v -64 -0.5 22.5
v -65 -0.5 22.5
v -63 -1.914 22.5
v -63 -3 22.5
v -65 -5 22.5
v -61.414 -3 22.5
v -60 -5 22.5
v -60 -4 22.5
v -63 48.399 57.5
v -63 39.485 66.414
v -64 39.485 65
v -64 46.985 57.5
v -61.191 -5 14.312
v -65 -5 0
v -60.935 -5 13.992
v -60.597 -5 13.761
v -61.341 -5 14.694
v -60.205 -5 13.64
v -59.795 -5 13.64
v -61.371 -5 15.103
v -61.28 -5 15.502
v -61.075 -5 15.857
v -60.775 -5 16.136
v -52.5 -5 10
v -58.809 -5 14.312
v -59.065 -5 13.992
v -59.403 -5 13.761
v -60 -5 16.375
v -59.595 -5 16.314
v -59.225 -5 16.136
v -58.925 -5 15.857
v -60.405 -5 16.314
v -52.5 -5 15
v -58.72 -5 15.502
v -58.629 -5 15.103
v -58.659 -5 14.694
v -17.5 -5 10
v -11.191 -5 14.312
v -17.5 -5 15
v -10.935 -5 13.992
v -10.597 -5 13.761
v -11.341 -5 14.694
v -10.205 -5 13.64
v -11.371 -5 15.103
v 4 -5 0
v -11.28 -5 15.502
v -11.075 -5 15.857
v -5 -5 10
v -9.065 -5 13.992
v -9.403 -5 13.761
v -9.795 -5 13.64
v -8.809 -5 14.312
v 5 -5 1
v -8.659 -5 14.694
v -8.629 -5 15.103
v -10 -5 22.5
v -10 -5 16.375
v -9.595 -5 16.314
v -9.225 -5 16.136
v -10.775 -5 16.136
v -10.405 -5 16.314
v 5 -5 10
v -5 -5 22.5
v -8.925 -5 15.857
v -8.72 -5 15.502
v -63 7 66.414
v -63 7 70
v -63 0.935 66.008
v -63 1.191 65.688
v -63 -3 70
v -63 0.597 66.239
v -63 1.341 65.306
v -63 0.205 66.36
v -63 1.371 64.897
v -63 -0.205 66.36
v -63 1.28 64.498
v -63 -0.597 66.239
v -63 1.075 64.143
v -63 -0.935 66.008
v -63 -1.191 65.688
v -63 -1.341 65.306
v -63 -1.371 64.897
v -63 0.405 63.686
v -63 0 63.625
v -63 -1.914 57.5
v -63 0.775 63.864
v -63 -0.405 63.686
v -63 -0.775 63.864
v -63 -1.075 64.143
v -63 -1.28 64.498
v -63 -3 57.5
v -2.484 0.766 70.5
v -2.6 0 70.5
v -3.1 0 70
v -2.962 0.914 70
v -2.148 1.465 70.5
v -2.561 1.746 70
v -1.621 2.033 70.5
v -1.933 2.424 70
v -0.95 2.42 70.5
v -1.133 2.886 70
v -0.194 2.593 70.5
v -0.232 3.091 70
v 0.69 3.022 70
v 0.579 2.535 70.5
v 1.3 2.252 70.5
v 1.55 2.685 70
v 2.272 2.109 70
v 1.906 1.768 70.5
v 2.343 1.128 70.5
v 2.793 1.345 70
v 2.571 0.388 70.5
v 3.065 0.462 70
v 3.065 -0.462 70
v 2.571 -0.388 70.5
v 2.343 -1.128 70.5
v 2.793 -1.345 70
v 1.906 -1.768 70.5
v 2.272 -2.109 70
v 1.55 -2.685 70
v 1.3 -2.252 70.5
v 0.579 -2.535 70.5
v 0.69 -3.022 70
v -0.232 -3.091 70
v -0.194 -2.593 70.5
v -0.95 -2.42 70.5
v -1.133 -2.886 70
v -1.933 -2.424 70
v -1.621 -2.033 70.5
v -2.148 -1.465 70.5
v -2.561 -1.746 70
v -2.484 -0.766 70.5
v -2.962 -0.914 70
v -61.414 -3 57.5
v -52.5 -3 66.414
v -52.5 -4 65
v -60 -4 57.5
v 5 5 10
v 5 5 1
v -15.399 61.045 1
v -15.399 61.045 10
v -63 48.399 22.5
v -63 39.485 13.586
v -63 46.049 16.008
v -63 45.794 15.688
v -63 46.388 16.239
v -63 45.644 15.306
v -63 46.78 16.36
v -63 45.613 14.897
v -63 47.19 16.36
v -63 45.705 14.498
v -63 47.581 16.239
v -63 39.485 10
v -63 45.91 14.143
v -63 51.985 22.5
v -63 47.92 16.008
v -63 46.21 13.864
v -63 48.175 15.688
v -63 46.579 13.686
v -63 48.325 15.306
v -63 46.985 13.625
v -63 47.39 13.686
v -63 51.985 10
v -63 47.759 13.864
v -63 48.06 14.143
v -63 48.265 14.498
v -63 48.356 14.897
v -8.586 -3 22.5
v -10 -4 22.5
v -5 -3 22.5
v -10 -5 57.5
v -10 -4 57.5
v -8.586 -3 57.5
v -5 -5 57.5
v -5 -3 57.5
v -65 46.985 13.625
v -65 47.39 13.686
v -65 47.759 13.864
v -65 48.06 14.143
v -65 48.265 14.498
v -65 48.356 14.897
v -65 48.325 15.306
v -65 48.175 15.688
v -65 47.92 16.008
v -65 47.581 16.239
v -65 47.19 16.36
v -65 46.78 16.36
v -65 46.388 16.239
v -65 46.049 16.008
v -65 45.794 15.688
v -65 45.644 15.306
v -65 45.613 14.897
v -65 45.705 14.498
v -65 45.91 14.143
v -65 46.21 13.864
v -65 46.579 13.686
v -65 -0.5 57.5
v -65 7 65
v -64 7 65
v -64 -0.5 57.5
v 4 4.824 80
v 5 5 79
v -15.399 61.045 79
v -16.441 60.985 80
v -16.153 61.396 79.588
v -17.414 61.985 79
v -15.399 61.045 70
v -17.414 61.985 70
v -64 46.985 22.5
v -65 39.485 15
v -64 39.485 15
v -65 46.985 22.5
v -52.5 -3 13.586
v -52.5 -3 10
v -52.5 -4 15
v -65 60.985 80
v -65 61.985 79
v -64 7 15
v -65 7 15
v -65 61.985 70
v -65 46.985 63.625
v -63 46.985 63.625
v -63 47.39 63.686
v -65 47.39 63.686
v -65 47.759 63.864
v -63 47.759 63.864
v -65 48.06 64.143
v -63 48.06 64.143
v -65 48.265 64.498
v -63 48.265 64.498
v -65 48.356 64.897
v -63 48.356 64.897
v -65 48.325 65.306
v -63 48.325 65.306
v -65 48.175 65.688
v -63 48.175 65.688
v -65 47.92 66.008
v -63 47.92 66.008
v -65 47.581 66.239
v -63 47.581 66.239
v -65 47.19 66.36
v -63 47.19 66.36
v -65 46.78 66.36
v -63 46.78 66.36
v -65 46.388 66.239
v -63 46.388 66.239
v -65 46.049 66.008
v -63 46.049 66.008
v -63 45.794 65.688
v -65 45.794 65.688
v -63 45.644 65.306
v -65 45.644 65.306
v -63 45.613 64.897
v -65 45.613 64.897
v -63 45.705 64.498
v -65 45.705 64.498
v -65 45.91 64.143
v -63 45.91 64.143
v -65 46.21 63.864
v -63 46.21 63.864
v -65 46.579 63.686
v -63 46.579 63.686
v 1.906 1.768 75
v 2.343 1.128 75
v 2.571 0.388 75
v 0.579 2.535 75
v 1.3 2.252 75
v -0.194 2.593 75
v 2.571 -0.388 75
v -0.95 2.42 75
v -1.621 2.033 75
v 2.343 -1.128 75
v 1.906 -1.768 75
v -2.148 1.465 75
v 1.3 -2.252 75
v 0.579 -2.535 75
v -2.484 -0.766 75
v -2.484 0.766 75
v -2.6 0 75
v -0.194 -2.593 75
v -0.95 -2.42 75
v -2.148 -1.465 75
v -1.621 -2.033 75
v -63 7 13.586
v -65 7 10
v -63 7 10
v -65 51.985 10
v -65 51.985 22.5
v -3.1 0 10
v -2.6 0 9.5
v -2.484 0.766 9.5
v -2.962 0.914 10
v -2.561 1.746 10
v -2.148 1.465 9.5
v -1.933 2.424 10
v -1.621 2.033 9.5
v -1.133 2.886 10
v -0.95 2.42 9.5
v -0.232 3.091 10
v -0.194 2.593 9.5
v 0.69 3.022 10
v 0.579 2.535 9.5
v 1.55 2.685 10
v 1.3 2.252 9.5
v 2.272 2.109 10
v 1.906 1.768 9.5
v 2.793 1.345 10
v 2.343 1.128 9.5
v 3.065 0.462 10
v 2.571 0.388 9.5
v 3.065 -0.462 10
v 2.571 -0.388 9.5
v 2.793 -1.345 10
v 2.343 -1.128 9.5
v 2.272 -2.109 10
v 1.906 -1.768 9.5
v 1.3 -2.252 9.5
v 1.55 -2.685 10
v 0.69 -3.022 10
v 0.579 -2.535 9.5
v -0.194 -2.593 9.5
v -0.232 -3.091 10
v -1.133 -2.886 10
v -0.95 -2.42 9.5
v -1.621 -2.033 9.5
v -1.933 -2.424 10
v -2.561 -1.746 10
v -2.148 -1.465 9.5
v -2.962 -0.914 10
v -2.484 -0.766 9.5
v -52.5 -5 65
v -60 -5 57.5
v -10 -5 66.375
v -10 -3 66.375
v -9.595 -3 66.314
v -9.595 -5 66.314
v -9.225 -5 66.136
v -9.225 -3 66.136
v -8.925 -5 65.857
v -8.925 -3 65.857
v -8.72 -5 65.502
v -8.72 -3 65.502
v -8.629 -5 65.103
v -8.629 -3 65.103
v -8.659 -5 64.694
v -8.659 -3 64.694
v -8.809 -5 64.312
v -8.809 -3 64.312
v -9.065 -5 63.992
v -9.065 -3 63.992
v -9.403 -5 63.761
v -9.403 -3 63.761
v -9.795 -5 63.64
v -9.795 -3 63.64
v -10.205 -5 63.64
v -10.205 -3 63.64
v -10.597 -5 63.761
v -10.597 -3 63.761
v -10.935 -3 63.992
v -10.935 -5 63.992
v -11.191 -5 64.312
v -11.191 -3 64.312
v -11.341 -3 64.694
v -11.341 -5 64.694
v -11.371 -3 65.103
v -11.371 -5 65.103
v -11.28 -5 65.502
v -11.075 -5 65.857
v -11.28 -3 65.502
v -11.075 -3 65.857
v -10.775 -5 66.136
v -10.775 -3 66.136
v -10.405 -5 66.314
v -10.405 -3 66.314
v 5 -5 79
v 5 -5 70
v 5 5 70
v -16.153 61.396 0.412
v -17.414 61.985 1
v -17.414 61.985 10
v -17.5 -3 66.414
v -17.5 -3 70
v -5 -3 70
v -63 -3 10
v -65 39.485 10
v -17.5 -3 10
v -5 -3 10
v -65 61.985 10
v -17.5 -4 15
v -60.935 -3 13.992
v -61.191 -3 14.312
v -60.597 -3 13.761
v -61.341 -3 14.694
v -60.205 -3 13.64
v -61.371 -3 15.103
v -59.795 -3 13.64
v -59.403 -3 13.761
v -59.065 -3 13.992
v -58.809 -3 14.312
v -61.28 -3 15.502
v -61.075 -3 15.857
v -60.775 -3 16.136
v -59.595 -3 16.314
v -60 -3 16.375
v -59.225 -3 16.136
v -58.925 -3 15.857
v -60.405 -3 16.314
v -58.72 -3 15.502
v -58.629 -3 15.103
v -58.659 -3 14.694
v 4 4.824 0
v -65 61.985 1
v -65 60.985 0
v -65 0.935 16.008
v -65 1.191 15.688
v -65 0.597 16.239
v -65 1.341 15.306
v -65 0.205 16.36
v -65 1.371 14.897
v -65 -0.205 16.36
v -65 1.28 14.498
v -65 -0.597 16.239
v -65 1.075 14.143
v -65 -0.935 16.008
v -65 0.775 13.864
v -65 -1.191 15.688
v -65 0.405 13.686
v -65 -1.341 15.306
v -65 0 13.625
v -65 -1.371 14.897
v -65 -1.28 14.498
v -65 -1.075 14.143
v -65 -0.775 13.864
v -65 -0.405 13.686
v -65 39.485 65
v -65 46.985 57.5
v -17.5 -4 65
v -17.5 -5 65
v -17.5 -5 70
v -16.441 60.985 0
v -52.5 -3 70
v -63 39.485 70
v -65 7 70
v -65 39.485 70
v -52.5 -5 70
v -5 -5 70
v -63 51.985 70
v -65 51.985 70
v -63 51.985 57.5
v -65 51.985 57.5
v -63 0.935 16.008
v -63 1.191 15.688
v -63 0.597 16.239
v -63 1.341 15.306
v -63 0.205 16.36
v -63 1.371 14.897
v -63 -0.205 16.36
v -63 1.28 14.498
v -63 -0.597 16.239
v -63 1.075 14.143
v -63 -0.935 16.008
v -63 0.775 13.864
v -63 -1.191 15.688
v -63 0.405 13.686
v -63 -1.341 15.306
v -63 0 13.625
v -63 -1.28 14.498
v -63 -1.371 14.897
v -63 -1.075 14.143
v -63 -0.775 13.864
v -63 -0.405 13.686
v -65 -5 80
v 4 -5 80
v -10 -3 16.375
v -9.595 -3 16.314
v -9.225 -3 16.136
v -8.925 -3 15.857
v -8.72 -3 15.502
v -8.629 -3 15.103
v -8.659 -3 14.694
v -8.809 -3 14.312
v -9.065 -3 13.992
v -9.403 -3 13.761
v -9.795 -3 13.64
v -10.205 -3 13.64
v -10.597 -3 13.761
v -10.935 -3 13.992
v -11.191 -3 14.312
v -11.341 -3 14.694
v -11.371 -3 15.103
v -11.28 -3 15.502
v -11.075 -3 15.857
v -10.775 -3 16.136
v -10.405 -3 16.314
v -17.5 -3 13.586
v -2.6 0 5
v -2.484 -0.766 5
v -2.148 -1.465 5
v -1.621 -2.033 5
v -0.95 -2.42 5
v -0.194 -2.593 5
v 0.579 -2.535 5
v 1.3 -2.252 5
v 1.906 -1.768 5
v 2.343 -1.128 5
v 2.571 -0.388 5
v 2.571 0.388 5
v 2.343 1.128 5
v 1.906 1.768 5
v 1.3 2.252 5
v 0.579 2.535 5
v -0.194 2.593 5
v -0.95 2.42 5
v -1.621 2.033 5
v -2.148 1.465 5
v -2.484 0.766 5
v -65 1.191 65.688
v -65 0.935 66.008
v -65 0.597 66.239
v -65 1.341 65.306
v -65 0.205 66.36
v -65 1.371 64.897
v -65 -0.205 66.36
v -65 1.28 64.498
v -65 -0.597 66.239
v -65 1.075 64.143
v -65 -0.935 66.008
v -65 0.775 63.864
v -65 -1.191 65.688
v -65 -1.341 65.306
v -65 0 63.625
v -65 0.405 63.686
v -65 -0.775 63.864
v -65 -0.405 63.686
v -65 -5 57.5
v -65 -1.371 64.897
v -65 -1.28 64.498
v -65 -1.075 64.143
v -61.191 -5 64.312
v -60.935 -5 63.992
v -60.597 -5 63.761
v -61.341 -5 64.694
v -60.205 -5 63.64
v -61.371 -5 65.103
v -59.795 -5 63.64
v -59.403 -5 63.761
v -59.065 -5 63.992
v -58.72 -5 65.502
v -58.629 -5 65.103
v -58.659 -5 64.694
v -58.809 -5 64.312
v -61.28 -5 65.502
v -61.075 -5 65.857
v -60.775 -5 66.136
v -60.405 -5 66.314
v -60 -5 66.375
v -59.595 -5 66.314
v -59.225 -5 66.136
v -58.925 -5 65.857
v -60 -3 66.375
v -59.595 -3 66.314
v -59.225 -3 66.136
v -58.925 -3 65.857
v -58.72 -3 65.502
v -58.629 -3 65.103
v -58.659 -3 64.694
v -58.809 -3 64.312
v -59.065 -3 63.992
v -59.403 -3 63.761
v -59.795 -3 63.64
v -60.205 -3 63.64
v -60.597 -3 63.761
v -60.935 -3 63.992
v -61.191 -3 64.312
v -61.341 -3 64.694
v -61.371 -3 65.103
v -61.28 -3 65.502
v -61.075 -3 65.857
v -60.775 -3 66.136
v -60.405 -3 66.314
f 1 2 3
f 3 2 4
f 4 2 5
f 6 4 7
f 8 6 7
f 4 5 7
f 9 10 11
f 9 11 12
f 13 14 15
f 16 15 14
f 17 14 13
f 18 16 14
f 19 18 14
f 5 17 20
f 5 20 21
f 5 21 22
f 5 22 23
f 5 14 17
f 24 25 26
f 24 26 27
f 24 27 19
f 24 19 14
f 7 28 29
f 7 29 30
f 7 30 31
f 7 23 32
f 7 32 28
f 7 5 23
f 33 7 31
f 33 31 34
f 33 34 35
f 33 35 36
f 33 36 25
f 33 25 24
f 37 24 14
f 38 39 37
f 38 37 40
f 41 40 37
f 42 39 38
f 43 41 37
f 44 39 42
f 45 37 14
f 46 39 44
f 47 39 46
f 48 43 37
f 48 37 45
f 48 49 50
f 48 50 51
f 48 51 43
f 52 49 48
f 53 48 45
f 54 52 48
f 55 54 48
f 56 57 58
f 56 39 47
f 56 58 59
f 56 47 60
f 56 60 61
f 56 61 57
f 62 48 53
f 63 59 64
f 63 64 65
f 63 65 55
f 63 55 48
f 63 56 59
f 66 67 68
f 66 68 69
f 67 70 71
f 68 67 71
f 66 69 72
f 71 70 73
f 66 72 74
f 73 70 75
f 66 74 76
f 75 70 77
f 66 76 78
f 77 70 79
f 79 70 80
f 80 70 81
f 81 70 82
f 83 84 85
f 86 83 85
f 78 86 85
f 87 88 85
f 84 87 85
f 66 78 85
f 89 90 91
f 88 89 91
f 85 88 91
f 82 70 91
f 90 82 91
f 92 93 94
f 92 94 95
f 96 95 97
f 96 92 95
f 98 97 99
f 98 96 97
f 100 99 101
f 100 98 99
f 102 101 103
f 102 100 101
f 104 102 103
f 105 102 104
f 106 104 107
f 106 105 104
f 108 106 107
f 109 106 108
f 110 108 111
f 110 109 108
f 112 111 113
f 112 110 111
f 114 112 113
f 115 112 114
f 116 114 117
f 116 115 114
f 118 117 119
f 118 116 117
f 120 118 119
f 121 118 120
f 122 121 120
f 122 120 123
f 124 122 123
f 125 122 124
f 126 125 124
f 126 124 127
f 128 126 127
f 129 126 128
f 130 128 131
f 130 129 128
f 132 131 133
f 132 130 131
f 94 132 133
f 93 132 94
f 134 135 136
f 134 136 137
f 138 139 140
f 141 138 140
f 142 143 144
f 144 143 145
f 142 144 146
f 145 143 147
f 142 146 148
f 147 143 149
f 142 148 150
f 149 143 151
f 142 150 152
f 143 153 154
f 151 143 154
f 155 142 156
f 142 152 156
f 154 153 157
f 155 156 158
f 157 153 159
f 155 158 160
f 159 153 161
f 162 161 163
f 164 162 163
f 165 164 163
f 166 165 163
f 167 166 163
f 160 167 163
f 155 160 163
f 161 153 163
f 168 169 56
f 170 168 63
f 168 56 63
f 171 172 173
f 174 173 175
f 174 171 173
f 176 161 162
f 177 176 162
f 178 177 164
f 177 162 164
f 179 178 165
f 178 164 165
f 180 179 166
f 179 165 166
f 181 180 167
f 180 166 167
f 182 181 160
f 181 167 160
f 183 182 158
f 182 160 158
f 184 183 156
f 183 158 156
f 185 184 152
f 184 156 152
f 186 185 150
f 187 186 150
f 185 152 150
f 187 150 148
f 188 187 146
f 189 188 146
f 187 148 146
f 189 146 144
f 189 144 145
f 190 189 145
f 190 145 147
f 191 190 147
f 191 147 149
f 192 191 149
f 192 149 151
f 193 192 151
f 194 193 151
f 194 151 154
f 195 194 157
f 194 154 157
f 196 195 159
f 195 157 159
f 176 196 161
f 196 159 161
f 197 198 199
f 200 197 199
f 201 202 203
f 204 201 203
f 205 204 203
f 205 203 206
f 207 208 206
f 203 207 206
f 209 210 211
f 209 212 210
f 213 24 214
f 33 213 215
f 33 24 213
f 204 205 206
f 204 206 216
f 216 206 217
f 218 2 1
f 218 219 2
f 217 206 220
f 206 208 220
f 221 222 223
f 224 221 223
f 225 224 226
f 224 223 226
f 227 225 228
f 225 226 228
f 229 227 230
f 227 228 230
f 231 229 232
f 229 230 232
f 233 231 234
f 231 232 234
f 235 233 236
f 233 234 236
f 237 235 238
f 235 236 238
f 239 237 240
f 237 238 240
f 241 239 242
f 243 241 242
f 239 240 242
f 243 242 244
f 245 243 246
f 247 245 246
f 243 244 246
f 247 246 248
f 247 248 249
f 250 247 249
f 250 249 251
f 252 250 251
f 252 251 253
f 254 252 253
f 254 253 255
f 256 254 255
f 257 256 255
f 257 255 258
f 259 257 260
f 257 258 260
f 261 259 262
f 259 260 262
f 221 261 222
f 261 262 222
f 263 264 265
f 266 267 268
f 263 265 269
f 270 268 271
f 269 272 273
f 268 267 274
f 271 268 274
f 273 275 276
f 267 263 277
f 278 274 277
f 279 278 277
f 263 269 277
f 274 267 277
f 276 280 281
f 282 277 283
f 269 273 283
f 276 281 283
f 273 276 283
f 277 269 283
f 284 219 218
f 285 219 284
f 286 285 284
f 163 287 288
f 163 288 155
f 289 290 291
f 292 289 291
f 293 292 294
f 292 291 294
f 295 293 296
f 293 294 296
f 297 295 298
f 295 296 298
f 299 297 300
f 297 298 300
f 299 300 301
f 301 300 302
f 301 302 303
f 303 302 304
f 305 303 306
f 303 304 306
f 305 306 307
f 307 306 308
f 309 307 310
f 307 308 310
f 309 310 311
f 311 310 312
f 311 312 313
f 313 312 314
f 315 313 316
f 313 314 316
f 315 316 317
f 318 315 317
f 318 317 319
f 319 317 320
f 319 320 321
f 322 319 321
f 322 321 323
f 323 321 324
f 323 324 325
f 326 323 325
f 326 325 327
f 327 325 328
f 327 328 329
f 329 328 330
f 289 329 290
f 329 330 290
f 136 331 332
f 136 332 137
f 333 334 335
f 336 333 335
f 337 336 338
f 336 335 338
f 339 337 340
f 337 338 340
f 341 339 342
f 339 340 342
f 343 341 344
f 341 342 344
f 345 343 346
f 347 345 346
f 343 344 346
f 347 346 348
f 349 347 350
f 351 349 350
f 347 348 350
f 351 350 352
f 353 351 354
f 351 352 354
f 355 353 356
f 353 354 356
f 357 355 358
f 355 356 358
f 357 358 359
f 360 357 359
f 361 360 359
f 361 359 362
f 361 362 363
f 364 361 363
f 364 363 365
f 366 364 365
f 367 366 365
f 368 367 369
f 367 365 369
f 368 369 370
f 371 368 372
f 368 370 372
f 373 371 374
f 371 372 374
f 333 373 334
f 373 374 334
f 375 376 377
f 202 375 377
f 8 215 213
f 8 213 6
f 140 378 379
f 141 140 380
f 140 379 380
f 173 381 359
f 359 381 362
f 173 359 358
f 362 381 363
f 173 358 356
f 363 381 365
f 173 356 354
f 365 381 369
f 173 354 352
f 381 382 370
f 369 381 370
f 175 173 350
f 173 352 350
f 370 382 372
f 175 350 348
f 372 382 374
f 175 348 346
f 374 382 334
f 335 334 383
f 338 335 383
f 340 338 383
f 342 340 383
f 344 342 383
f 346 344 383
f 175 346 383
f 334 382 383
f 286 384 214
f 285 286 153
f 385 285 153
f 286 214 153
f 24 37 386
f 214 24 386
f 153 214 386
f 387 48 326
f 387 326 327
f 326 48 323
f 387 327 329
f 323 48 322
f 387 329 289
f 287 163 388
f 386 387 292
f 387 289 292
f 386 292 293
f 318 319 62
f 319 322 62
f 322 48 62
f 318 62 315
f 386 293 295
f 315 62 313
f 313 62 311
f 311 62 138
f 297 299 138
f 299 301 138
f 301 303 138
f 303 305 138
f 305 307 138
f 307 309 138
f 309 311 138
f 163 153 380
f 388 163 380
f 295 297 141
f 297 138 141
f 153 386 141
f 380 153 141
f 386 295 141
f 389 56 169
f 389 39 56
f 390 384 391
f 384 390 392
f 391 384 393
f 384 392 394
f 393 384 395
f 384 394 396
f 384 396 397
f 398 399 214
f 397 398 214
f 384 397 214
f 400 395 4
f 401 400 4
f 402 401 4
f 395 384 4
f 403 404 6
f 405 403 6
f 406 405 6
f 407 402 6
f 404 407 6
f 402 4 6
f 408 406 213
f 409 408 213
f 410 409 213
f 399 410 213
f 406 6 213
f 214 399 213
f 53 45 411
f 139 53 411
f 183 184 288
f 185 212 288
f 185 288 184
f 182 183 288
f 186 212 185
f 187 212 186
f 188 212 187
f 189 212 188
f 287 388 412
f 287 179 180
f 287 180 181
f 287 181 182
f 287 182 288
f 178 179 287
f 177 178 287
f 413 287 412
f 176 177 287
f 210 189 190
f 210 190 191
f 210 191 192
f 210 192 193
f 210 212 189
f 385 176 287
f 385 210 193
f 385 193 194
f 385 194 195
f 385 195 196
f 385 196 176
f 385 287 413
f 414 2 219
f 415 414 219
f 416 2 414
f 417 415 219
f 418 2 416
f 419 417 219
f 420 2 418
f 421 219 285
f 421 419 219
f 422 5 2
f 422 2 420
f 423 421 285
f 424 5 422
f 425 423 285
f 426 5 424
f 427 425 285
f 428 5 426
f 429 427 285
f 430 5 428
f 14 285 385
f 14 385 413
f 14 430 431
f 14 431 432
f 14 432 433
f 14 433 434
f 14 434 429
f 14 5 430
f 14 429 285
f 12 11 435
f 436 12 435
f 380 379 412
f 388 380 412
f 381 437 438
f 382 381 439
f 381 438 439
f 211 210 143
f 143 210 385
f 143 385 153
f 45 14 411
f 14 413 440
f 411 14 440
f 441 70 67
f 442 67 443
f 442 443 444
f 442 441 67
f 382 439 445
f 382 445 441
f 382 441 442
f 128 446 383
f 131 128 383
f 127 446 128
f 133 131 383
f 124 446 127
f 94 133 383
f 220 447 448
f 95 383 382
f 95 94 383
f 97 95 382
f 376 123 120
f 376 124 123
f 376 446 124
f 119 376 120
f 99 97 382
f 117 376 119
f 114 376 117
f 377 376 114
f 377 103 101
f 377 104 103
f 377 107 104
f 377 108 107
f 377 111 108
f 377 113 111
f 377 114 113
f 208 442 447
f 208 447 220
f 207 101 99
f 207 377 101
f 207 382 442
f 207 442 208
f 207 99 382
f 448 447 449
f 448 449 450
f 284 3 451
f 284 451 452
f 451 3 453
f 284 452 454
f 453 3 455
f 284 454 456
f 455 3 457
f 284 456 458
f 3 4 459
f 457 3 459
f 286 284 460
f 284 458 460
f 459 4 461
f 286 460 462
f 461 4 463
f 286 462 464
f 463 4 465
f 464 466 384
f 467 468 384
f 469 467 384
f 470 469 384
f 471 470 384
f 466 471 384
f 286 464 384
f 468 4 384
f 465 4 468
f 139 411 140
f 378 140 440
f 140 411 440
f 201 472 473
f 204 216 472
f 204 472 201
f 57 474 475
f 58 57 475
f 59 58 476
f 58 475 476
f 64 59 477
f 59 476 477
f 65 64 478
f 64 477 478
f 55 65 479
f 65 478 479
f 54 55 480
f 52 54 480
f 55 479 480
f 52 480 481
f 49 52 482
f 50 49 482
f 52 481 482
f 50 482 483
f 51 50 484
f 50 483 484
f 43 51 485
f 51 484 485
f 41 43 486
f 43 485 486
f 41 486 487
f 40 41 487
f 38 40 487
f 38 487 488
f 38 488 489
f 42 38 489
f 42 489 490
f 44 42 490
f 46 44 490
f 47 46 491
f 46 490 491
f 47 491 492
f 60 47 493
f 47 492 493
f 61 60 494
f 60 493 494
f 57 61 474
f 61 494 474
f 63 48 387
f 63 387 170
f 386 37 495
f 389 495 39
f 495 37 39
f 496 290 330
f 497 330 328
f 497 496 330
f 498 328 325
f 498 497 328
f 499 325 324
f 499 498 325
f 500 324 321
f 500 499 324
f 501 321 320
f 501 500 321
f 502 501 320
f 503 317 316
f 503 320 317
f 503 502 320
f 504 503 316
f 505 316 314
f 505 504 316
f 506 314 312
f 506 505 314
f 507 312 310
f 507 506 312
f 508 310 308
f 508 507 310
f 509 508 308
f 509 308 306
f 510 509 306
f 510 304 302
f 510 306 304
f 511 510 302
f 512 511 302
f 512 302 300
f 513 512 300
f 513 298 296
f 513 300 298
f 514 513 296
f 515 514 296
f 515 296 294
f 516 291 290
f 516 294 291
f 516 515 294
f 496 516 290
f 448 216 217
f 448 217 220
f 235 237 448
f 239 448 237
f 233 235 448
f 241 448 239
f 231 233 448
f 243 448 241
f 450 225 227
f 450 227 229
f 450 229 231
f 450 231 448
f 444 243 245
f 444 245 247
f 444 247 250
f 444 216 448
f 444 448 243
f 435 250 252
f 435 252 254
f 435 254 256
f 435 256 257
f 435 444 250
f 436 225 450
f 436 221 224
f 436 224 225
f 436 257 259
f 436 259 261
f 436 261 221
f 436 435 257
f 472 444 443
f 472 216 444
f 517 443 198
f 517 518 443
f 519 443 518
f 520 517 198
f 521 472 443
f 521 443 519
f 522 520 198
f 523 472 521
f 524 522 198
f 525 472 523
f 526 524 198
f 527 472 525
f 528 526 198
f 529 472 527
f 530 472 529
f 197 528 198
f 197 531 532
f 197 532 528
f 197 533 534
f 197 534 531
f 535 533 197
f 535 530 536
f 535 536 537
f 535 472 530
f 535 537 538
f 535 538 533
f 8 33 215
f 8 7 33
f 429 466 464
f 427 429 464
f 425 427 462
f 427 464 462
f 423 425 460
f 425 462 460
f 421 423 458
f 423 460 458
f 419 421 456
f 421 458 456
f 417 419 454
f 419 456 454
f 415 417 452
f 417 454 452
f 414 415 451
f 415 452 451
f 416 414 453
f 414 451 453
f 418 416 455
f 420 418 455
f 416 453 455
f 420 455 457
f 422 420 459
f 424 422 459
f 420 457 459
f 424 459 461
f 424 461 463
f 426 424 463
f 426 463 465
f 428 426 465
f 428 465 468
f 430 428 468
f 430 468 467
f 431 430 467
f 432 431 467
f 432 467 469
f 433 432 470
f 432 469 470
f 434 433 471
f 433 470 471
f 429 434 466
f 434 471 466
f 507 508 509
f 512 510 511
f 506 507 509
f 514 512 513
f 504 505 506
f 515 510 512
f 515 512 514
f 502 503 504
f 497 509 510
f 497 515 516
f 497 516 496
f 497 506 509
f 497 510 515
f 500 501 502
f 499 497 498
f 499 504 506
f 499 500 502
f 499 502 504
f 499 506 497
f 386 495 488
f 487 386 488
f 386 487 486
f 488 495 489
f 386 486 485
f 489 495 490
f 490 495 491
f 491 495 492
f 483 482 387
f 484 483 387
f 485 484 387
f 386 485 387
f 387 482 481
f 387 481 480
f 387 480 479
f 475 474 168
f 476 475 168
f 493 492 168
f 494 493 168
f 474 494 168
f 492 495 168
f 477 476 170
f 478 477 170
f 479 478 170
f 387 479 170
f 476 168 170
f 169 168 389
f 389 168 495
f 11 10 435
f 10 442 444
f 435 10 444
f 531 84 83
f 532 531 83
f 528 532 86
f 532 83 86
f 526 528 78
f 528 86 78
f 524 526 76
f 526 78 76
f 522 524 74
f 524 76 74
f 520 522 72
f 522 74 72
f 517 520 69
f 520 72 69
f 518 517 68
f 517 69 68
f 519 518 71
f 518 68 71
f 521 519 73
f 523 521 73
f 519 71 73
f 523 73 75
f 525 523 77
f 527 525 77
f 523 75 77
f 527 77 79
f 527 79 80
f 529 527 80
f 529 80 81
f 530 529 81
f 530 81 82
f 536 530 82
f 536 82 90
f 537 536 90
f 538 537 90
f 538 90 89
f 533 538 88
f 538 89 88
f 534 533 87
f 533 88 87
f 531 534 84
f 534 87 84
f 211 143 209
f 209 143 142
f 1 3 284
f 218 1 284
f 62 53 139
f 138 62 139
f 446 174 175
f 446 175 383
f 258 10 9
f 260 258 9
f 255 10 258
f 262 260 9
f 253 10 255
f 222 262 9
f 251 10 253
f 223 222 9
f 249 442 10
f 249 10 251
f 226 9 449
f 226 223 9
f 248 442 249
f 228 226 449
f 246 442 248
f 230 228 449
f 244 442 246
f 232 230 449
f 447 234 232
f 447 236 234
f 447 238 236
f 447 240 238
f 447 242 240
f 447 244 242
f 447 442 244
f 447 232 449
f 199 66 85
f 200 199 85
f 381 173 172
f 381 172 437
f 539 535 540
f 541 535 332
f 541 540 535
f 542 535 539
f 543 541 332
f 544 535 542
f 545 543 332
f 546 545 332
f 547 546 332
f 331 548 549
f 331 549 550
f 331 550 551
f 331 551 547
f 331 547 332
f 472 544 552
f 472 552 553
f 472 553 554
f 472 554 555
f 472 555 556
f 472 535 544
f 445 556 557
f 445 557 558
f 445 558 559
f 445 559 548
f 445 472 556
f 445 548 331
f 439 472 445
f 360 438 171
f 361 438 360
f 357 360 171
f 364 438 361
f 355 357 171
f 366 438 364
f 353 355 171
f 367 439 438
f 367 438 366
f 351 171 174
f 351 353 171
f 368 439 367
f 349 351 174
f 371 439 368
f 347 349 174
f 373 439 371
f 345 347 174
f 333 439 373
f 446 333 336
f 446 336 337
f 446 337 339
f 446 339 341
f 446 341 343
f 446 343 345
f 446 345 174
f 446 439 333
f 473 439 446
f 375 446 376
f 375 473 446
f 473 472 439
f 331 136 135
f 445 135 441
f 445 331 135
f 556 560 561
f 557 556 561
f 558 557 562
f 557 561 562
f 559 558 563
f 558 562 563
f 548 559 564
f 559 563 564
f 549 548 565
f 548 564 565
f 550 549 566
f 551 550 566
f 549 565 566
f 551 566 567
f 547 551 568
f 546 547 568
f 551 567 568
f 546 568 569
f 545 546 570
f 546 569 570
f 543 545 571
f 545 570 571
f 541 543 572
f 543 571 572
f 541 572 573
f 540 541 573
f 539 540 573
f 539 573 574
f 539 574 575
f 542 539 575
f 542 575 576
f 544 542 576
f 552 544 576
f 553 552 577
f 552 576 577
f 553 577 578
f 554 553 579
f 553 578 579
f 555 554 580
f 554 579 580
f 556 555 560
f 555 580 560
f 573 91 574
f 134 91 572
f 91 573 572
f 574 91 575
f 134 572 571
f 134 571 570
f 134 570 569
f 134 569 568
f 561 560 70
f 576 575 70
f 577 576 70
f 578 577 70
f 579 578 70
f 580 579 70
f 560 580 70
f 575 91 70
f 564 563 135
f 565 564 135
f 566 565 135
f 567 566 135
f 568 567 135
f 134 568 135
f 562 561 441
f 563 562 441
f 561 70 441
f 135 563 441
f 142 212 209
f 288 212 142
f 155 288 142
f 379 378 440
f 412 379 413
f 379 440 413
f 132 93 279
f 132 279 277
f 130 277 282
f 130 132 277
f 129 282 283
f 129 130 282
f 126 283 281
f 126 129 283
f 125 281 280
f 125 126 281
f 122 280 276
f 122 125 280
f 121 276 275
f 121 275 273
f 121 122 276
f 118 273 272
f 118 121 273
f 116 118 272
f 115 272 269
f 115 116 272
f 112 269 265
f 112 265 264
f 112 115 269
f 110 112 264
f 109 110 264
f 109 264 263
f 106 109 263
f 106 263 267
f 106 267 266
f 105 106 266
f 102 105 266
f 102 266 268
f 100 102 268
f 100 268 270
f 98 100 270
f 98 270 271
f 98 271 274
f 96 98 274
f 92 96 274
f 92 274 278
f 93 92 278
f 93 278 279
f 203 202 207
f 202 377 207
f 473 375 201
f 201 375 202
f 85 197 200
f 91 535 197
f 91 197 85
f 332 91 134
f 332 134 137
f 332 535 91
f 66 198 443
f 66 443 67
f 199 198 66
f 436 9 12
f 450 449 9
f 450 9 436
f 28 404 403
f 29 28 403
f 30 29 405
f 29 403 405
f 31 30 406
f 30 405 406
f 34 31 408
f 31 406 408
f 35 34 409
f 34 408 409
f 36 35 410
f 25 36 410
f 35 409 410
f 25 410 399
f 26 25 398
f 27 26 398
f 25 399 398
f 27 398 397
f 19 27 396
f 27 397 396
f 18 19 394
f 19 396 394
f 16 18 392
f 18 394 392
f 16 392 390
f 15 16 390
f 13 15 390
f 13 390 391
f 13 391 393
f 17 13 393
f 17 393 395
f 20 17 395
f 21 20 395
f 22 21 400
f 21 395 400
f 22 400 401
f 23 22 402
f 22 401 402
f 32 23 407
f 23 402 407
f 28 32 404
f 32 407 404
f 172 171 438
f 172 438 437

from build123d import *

# Parameters (mm, degrees)
BOSS_EXTRUDE1_DEPTH     = 80
CUT_EXTRUDE3_REACH      = 125.053
SKETCH2_W               = 60
SKETCH2_H               = 56.984631039
SKETCH2_H_2             = 10
CUT_EXTRUDE4_DEPTH      = 65
CUT_EXTRUDE4_DEPTH_BACK = 5
SKETCH4_R               = 2.6
SKETCH6_W               = 12.5
SKETCH6_H               = 12.5
BOSS_EXTRUDE2_DEPTH     = 2
CHAMFER1_SIZE           = 7.5
CHAMFER2_SIZE           = 7.5
SKETCH7_R               = 1.375
CUT_EXTRUDE5_DEPTH      = 2
CHAMFER3_SIZE           = 1
CHAMFER4_SIZE           = 1
CHAMFER5_SIZE           = 1
CHAMFER6_SIZE           = 1
CHAMFER7_SIZE           = 0.5
CHAMFER8_SIZE           = 0.5
CHAMFER9_SIZE           = 1
CHAMFER9_SIZE2          = 1.673157185
CHAMFER10_SIZE          = 1
CHAMFER10_SIZE2         = 1.673157185
SKETCH9_W               = 2
SKETCH9_H               = 12.5
BOSS_EXTRUDE3_DEPTH     = 10
CHAMFER11_SIZE          = 7.5
CHAMFER12_SIZE          = 7.5
CHAMFER13_SIZE          = 1
CHAMFER14_SIZE          = 1
SKETCH11_W              = 2
SKETCH11_H              = 12.5
BOSS_EXTRUDE4_DEPTH     = 12.5
SKETCH12_W              = 2
SKETCH12_H              = 12.5
BOSS_EXTRUDE5_DEPTH     = 12.5
CHAMFER15_SIZE          = 7.5
CHAMFER16_SIZE          = 7.5
CHAMFER17_SIZE          = 1
CHAMFER18_SIZE          = 1
SKETCH10_R              = 1.375
CUT_EXTRUDE6_DEPTH      = 2


with BuildPart() as part:
    # Sketch1 → Boss-Extrude1 (new body)
    with BuildSketch(Plane.XY):
        Polygon((-64.999999996, -5), (5, -5), (5, 5), (-15.740709509, 61.984631039), (-64.999999996, 61.984631039), align=None)
    extrude(amount=BOSS_EXTRUDE1_DEPTH)

    # Cut-Extrude3: up to this face of the body (flat: up to its plane)
    cut_extrude3_end = Plane(part.part.faces().sort_by_distance((-64.999999996, 28.49231552, 40))[0])
    # Sketch2 → Cut-Extrude3 (cut, up to the picked face)
    with BuildSketch(Plane(origin=(5, 0, 0), x_dir=(0, 0, -1), z_dir=(1, 0, 0)), mode=Mode.PRIVATE) as cut_extrude3_sk1:
        with Locations((-40, 33.49231552)):
            Rectangle(SKETCH2_W, SKETCH2_H)
    cut_extrude3_tool1 = split(extrude(cut_extrude3_sk1.sketch, amount=-CUT_EXTRUDE3_REACH, mode=Mode.PRIVATE), bisect_by=cut_extrude3_end, keep=Keep.BOTH, mode=Mode.PRIVATE)
    # Sketch2 → Cut-Extrude3 (cut, up to the picked face)
    with BuildSketch(Plane(origin=(5, 0, 0), x_dir=(0, 0, -1), z_dir=(1, 0, 0)), mode=Mode.PRIVATE) as cut_extrude3_sk2:
        with Locations((-40, 0)):
            Rectangle(SKETCH2_W, SKETCH2_H_2)
    cut_extrude3_tool2 = split(extrude(cut_extrude3_sk2.sketch, amount=-CUT_EXTRUDE3_REACH, mode=Mode.PRIVATE), bisect_by=cut_extrude3_end, keep=Keep.BOTH, mode=Mode.PRIVATE)
    add(cut_extrude3_tool1.solids().sort_by(Axis((5, 33.492316, 40), (-1, 0, 0)))[0], mode=Mode.SUBTRACT)
    add(cut_extrude3_tool2.solids().sort_by(Axis((5, 0, 40), (-1, 0, 0)))[0], mode=Mode.SUBTRACT)


with BuildPart() as cut_extrude3_piece_1:
    # of the separate pieces the step leaves, piece 1, a body of its own (cut_extrude3_pieces)
    add(part.part.solids().sort_by_distance((-15.740709509, 61.984631039, 0))[0])


with BuildPart() as cut_extrude3_piece_2:
    # of the separate pieces the step leaves, piece 2, a body of its own (cut_extrude3_pieces)
    add(part.part.solids().sort_by_distance((-15.740709509, 61.984631039, 70))[0])


with BuildPart() as cut_extrude4_tool:
    # Sketch4 → Cut-Extrude4 (new, two sides: drawn at the far end of the back side and taken through both)
    with BuildSketch(Plane.XY.offset(10).offset(-CUT_EXTRUDE4_DEPTH_BACK)):
        with Locations(Location((0, 0, 0), (0, 0, 180))):
            Circle(SKETCH4_R)
    extrude(amount=CUT_EXTRUDE4_DEPTH + CUT_EXTRUDE4_DEPTH_BACK)


with BuildPart() as cut_extrude3_piece_1_1:
    add(cut_extrude3_piece_1.part)

    # Cut-Extrude4: cut by cut_extrude4_tool
    add(cut_extrude4_tool.part, mode=Mode.SUBTRACT)



with BuildPart() as cut_extrude3_piece_2_1:
    add(cut_extrude3_piece_2.part)

    # Cut-Extrude4: cut by cut_extrude4_tool
    add(cut_extrude4_tool.part, mode=Mode.SUBTRACT)


with BuildPart() as cut_extrude3_piece_1_2:
    add(cut_extrude3_piece_1_1.part)

    add(cut_extrude3_piece_2_1.part)  # Boss-Extrude2 merges Cut-Extrude3 piece 2
    # Sketch6 → Boss-Extrude2 (add)
    with BuildSketch(Plane.XZ.offset(5)):
        with Locations((-11.249999996, 63.75)):
            Rectangle(SKETCH6_W, SKETCH6_H)
        with Locations((-58.749999996, 63.75)):
            Rectangle(SKETCH6_W, SKETCH6_H)
        with Locations((-58.749999996, 16.25)):
            Rectangle(SKETCH6_W, SKETCH6_H)
        with Locations((-11.249999996, 16.25)):
            Rectangle(SKETCH6_W, SKETCH6_H)
    extrude(amount=-BOSS_EXTRUDE2_DEPTH)

    # Chamfer1
    chamfer1_edges = [cut_extrude3_piece_1_2.edges().sort_by_distance(p)[0] for p in [
        (-52.499999996, -4, 22.5),
        (-17.499999996, -4, 22.5),
    ]]
    chamfer(chamfer1_edges, length=CHAMFER1_SIZE)

    # Chamfer2
    chamfer2_edges = [cut_extrude3_piece_1_2.edges().sort_by_distance(p)[0] for p in [
        (-17.499999996, -4, 57.5),
        (-52.499999996, -4, 57.5),
    ]]
    chamfer(chamfer2_edges, length=CHAMFER2_SIZE)

    # Sketch7 → Cut-Extrude5 (cut)
    with BuildSketch(Plane(origin=(0, -3, 0), x_dir=(1, 0, 0), z_dir=(0, 1, 0))):
        with Locations(Location((-59.999999996, -15, 0), (0, 0, 270))):
            Circle(SKETCH7_R)
        with Locations(Location((-9.999999996, -15, 0), (0, 0, 270))):
            Circle(SKETCH7_R)
        with Locations(Location((-9.999999996, -65, 0), (0, 0, 270))):
            Circle(SKETCH7_R)
        with Locations(Location((-59.999999996, -65, 0), (0, 0, 270))):
            Circle(SKETCH7_R)
    extrude(amount=-CUT_EXTRUDE5_DEPTH, mode=Mode.SUBTRACT)

    # Chamfer3
    chamfer3_edges = [cut_extrude3_piece_1_2.edges().sort_by_distance(p)[0] for p in [
        (-40.370354753, 61.984631039, 0),
        (5, 0, 0),
        (-5.370354754, 33.49231552, 0),
    ]]
    chamfer(chamfer3_edges, length=CHAMFER3_SIZE)

    # Chamfer4
    chamfer4_edges = [cut_extrude3_piece_1_2.edges().sort_by_distance(p)[0] for p in [
        (5, 0, 80),
        (-5.370354754, 33.49231552, 80),
        (-40.370354753, 61.984631039, 80),
    ]]
    chamfer(chamfer4_edges, length=CHAMFER4_SIZE)

    # Chamfer5
    chamfer5_edges = [cut_extrude3_piece_1_2.edges().sort_by_distance(p)[0] for p in [
        (-13.749999996, -3, 61.25),
        (-56.249999996, -3, 61.25),
    ]]
    chamfer(chamfer5_edges, length=CHAMFER5_SIZE)

    # Chamfer6
    chamfer6_edges = [cut_extrude3_piece_1_2.edges().sort_by_distance(p)[0] for p in [
        (-13.749999996, -3, 18.75),
        (-56.249999996, -3, 18.75),
    ]]
    chamfer(chamfer6_edges, length=CHAMFER6_SIZE)

    # Chamfer7
    chamfer7_edges = [cut_extrude3_piece_1_2.edges().sort_by_distance(p)[0] for p in [
        (2.6, 0, 70),
    ]]
    chamfer(chamfer7_edges, length=CHAMFER7_SIZE)

    # Chamfer8
    chamfer8_edges = [cut_extrude3_piece_1_2.edges().sort_by_distance(p)[0] for p in [
        (2.6, 0, 10),
    ]]
    chamfer(chamfer8_edges, length=CHAMFER8_SIZE)

    # Chamfer9
    chamfer9_edges = [cut_extrude3_piece_1_2.edges().sort_by_distance(p)[0] for p in [
        (-15.740709509, 61.984631039, 74.5),
    ]]
    chamfer9_side = [cut_extrude3_piece_1_2.faces().sort_by_distance(p)[0] for p in [
        (-5.370354754, 33.49231552, 74.5),
    ]]
    chamfer(chamfer9_edges, length=CHAMFER9_SIZE, length2=CHAMFER9_SIZE2, reference=chamfer9_side[0])

    # Chamfer10
    chamfer10_edges = [cut_extrude3_piece_1_2.edges().sort_by_distance(p)[0] for p in [
        (-15.740709509, 61.984631039, 5.5),
    ]]
    chamfer10_side = [cut_extrude3_piece_1_2.faces().sort_by_distance(p)[0] for p in [
        (-5.370354754, 33.49231552, 5.5),
    ]]
    chamfer(chamfer10_edges, length=CHAMFER10_SIZE, length2=CHAMFER10_SIZE2, reference=chamfer10_side[0])

    # Sketch9 → Boss-Extrude3 (add)
    with BuildSketch(Plane(origin=(0, -3, 0), x_dir=(1, 0, 0), z_dir=(0, 1, 0))):
        with Locations((-63.999999996, -16.25)):
            Rectangle(SKETCH9_W, SKETCH9_H)
        with Locations((-63.999999996, -63.75)):
            Rectangle(SKETCH9_W, SKETCH9_H)
    extrude(amount=BOSS_EXTRUDE3_DEPTH)

    # Chamfer11
    chamfer11_edges = [cut_extrude3_piece_1_2.edges().sort_by_distance(p)[0] for p in [
        (-63.999999996, 7, 22.5),
    ]]
    chamfer(chamfer11_edges, length=CHAMFER11_SIZE)

    # Chamfer12
    chamfer12_edges = [cut_extrude3_piece_1_2.edges().sort_by_distance(p)[0] for p in [
        (-63.999999996, 7, 57.5),
    ]]
    chamfer(chamfer12_edges, length=CHAMFER12_SIZE)

    # Chamfer13
    chamfer13_edges = [cut_extrude3_piece_1_2.edges().sort_by_distance(p)[0] for p in [
        (-62.999999996, 3.25, 18.75),
    ]]
    chamfer(chamfer13_edges, length=CHAMFER13_SIZE)

    # Chamfer14
    chamfer14_edges = [cut_extrude3_piece_1_2.edges().sort_by_distance(p)[0] for p in [
        (-62.999999996, 3.25, 61.25),
    ]]
    chamfer(chamfer14_edges, length=CHAMFER14_SIZE)

    # Sketch11 → Boss-Extrude4 (add)
    with BuildSketch(Plane(origin=(0, 0, 70), x_dir=(-1, 0, 0), z_dir=(0, 0, -1))):
        with Locations((63.999999996, 45.734631039)):
            Rectangle(SKETCH11_W, SKETCH11_H)
    extrude(amount=BOSS_EXTRUDE4_DEPTH)

    # Sketch12 → Boss-Extrude5 (add)
    with BuildSketch(Plane.XY.offset(10)):
        with Locations((-63.999999996, 45.734631039)):
            Rectangle(SKETCH12_W, SKETCH12_H)
    extrude(amount=BOSS_EXTRUDE5_DEPTH)

    # Chamfer15
    chamfer15_edges = [cut_extrude3_piece_1_2.edges().sort_by_distance(p)[0] for p in [
        (-63.999999996, 39.484631039, 22.5),
    ]]
    chamfer(chamfer15_edges, length=CHAMFER15_SIZE)

    # Chamfer16
    chamfer16_edges = [cut_extrude3_piece_1_2.edges().sort_by_distance(p)[0] for p in [
        (-63.999999996, 39.484631039, 57.5),
    ]]
    chamfer(chamfer16_edges, length=CHAMFER16_SIZE)

    # Chamfer17
    chamfer17_edges = [cut_extrude3_piece_1_2.edges().sort_by_distance(p)[0] for p in [
        (-62.999999996, 43.234631039, 61.25),
    ]]
    chamfer(chamfer17_edges, length=CHAMFER17_SIZE)

    # Chamfer18
    chamfer18_edges = [cut_extrude3_piece_1_2.edges().sort_by_distance(p)[0] for p in [
        (-62.999999996, 43.234631039, 18.75),
    ]]
    chamfer(chamfer18_edges, length=CHAMFER18_SIZE)

    # Sketch10 → Cut-Extrude6 (cut)
    with BuildSketch(Plane(origin=(-62.999999996, 0, 0), x_dir=(0, 0, -1), z_dir=(1, 0, 0))):
        with Locations((-65, 0)):
            Circle(SKETCH10_R)
        with Locations((-15, 0)):
            Circle(SKETCH10_R)
        with Locations((-65, 46.984631039)):
            Circle(SKETCH10_R)
        with Locations((-15, 46.984631039)):
            Circle(SKETCH10_R)
    extrude(amount=-CUT_EXTRUDE6_DEPTH, mode=Mode.SUBTRACT)


solid = cut_extrude3_piece_1_2.part
